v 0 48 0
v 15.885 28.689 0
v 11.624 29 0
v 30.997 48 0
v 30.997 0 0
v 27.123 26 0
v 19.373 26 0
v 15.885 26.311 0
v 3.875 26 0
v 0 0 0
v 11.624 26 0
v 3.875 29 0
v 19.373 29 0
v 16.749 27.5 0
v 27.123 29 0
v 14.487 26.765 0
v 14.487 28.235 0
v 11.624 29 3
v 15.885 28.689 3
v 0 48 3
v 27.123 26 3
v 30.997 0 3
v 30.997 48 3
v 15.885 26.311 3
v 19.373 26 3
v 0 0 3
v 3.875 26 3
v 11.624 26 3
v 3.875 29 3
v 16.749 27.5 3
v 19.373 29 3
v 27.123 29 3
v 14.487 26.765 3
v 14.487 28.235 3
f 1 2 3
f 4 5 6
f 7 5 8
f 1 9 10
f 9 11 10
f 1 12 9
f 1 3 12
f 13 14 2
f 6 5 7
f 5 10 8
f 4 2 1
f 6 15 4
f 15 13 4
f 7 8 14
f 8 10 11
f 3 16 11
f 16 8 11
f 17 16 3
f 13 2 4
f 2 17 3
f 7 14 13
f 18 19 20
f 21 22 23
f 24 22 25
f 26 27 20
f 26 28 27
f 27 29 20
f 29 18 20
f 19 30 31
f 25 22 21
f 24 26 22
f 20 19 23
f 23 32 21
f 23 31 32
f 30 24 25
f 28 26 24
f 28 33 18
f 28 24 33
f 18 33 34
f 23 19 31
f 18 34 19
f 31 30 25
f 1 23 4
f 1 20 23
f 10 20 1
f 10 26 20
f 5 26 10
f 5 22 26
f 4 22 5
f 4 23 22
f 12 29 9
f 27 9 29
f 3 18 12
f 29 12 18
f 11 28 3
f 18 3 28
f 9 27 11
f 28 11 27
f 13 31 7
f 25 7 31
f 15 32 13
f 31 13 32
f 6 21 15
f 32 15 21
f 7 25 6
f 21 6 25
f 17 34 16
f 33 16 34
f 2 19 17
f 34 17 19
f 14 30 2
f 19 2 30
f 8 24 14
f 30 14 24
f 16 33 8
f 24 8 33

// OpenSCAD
// file: ../connectors/captive_nut.scad
// generates sketches for a "captive nut" joint

module nut_slot_cut(bolt_width, insert_length, nut_indent, nut_width) {
    translate([0,-bolt_width/2,0]) square([nut_indent, bolt_width]);
    translate([nut_indent, -(nut_width*1.5)/2, 0]) polygon([
        [0, 0],
        [(insert_length - nut_indent), (nut_width*1.5)/2],
        [0, nut_width*1.5]
    ]);
}

module nut_slot_add(height, width, translation) {
    for (i = [-1:2:1]) {
        translate([height/2, i*translation, 0]) square([height, width], center=true);
    }
}

module bolt_slot(height, width, translation, circle_dia) {
    circle(d=circle_dia);
    for (i = [-1:2:1]) {
        translate([i*translation, 0, 0]) square([width, height], center=true);
    }
}


//nut_slot_cut(3, 12, 8, 5);
//nut_slot_add(3, 10, 8);
// main file
use <../connectors/captive_nut.scad>

// Side plates for the base

air_holes_length = 0.6; // percentage of total length for holes
air_holes_width = 0.6; // percentage of plate width for holes
air_holes_thickness = 3; // width of holes

module side_plate(tk, width, height, num_plates, air_holes_num, servo_height, slot_width, slot_translation, bolt_diameter) {
    height = height - tk;
    air_holes_num = air_holes_num - 1;
    linear_extrude(tk) difference() {
        square([width, height], center = false);

        if (air_holes_num > 0) {
            start = width * (1 - air_holes_width) / 2;
            end = start + width * air_holes_width;
            vertical_offset = height / 2;
    
            for (i = [start:(end-start)/air_holes_num:end + 1]) {
                translate([i, vertical_offset])
                square([air_holes_thickness, height*air_holes_length], center = true);
            }
        } else {
            translate([width/2, servo_height, 0]) bolt_slot(tk, slot_width, slot_translation, bolt_diameter);
        }
    }
}

side_plate(3, 30.9974, 51, 8, 0, 27.5, 7.74934, 7.74934, 2.5);
